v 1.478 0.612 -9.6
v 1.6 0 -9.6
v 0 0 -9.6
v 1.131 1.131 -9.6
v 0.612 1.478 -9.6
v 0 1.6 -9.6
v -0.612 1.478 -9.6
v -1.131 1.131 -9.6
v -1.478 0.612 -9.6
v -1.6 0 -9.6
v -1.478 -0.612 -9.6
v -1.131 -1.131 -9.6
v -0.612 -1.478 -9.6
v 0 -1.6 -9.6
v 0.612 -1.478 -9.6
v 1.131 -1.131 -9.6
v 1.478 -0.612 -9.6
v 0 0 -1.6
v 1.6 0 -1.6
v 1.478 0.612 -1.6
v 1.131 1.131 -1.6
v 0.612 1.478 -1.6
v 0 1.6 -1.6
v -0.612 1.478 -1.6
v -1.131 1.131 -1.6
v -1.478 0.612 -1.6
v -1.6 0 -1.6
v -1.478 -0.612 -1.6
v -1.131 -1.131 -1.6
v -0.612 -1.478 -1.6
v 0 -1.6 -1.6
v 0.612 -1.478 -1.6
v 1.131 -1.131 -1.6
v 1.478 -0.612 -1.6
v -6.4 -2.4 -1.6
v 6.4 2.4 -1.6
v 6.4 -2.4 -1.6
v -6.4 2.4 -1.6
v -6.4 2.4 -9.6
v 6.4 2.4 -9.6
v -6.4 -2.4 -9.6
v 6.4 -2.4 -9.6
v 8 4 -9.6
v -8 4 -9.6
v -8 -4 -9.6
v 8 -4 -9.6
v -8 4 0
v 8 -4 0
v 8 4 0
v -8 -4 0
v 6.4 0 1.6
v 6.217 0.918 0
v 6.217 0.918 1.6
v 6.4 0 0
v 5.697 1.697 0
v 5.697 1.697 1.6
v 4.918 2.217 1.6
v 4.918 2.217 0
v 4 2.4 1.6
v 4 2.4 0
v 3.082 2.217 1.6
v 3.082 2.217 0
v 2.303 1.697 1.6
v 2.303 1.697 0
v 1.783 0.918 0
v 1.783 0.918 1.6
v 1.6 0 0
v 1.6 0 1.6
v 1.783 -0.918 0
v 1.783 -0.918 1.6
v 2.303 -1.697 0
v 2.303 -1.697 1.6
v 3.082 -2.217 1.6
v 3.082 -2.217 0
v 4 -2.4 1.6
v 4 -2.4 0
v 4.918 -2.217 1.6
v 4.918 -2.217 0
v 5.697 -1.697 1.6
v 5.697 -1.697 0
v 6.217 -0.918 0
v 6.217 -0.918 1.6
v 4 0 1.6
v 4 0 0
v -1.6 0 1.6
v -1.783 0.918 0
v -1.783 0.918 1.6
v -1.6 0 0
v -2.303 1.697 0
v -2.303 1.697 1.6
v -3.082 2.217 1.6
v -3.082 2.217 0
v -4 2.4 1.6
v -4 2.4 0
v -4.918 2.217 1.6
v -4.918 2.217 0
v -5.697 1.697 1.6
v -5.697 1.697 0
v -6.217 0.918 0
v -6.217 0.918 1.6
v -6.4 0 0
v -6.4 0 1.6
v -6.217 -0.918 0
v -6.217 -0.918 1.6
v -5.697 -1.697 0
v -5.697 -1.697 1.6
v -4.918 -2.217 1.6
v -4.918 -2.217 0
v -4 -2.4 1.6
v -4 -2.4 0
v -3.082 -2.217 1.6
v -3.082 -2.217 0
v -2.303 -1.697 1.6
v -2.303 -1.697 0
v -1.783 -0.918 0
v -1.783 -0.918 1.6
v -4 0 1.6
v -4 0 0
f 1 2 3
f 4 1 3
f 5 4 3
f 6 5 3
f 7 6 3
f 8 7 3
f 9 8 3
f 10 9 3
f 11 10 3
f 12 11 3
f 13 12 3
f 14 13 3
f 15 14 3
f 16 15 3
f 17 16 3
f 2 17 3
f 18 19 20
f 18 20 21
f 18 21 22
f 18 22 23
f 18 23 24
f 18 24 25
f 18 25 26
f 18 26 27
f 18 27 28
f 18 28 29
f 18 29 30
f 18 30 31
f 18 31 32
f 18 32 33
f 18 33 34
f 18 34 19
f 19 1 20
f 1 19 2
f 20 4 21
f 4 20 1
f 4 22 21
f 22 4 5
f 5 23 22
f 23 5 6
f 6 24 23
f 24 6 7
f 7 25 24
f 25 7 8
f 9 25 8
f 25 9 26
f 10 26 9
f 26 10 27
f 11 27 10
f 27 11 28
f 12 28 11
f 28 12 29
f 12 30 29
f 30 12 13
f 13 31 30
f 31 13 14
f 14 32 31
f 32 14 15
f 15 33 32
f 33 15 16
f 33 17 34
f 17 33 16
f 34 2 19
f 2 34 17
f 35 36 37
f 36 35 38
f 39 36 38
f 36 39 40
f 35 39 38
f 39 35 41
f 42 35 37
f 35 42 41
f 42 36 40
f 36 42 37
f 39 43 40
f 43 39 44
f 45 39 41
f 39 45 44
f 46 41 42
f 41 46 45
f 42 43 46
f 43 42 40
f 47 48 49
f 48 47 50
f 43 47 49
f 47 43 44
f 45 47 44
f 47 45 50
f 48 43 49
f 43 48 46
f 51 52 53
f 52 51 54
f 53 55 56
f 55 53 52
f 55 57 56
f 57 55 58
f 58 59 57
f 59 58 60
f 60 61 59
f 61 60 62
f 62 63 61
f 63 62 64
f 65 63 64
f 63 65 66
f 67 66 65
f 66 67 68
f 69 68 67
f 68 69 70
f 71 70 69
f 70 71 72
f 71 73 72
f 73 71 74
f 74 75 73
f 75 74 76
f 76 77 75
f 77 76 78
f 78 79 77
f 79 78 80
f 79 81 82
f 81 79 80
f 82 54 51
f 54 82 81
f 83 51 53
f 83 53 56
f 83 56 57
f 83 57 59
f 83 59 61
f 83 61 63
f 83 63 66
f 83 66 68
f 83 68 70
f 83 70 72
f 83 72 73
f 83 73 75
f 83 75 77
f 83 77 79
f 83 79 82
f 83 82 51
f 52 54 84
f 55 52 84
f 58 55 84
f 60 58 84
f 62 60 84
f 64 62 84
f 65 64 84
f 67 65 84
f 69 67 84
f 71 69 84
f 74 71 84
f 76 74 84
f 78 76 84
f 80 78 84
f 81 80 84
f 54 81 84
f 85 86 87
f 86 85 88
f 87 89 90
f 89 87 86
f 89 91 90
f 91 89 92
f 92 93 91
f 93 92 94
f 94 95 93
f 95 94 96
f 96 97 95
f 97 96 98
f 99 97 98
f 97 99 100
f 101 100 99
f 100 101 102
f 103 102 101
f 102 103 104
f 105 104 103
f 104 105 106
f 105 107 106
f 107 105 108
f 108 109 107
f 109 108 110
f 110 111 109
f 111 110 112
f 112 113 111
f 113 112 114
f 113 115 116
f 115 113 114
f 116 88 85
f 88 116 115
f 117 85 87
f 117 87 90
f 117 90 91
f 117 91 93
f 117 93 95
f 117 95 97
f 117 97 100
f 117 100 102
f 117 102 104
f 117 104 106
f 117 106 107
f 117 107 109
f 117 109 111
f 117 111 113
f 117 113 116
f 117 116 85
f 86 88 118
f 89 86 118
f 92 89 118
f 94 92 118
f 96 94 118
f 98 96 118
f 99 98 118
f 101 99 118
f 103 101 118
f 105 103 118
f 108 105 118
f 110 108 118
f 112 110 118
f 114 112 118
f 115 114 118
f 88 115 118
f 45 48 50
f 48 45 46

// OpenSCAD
// file: ../p/4-4edge.scad
use <../lib.scad>
function ldraw_lib__4_4edge() = [
// 0 Circle 1.0
// 0 Name: 4-4edge.dat
// 0 Author: James Jessiman
// 0 !LDRAW_ORG Primitive UPDATE 2017-01
// 0 !LICENSE Licensed under CC BY 2.0 and CC BY 4.0 : see CAreadme.txt
// 
// 0 BFC CERTIFY CCW
  [0,"BFC","CERTIFY"],
  [0,"BFC","CCW"],
// 
// 0 !HISTORY 1998-12-15 [PTadmin] Official Update 1998-10
// 0 !HISTORY 2005-12-28 [PTadmin] Official Update 2005-01
// 0 !HISTORY 2007-06-24 [PTadmin] Header formatted for Contributor Agreement
// 0 !HISTORY 2008-07-01 [PTadmin] Official Update 2008-01
// 0 !HISTORY 2017-01-15 [Steffen] BFCed
// 0 !HISTORY 2017-12-30 [PTadmin] Official Update 2017-01
// 
// 
// 2 24 1 0 0 0.9239 0 0.3827
  [2,24,1,0,0,0.9239,0,0.3827],
// 2 24 0.9239 0 0.3827 0.7071 0 0.7071
  [2,24,0.9239,0,0.3827,0.7071,0,0.7071],
// 2 24 0.7071 0 0.7071 0.3827 0 0.9239
  [2,24,0.7071,0,0.7071,0.3827,0,0.9239],
// 2 24 0.3827 0 0.9239 0 0 1
  [2,24,0.3827,0,0.9239,0,0,1],
// 2 24 0 0 1 -0.3827 0 0.9239
  [2,24,0,0,1,-0.3827,0,0.9239],
// 2 24 -0.3827 0 0.9239 -0.7071 0 0.7071
  [2,24,-0.3827,0,0.9239,-0.7071,0,0.7071],
// 2 24 -0.7071 0 0.7071 -0.9239 0 0.3827
  [2,24,-0.7071,0,0.7071,-0.9239,0,0.3827],
// 2 24 -0.9239 0 0.3827 -1 0 -0
  [2,24,-0.9239,0,0.3827,-1,0,-0],
// 2 24 -1 0 -0 -0.9239 0 -0.3827
  [2,24,-1,0,-0,-0.9239,0,-0.3827],
// 2 24 -0.9239 0 -0.3827 -0.7071 0 -0.7071
  [2,24,-0.9239,0,-0.3827,-0.7071,0,-0.7071],
// 2 24 -0.7071 0 -0.7071 -0.3827 0 -0.9239
  [2,24,-0.7071,0,-0.7071,-0.3827,0,-0.9239],
// 2 24 -0.3827 0 -0.9239 0 0 -1
  [2,24,-0.3827,0,-0.9239,0,0,-1],
// 2 24 0 0 -1 0.3827 0 -0.9239
  [2,24,0,0,-1,0.3827,0,-0.9239],
// 2 24 0.3827 0 -0.9239 0.7071 0 -0.7071
  [2,24,0.3827,0,-0.9239,0.7071,0,-0.7071],
// 2 24 0.7071 0 -0.7071 0.9239 0 -0.3827
  [2,24,0.7071,0,-0.7071,0.9239,0,-0.3827],
// 2 24 0.9239 0 -0.3827 1 0 0
  [2,24,0.9239,0,-0.3827,1,0,0],
];
module ldraw_lib__4_4edge(step=0, col=false, unit=2/5, alt=false, line=0.2, solid=!$preview)
    makepoly(ldraw_lib__4_4edge(), step=step, col=col, unit=unit, alt=alt, line=line, solid=solid);
ldraw_lib__4_4edge(line=0.2);
// file: ../p/4-4disc.scad
use <../lib.scad>
function ldraw_lib__4_4disc() = [
// 0 Disc 1.0
// 0 Name: 4-4disc.dat
// 0 Author: James Jessiman
// 0 !LDRAW_ORG Primitive UPDATE 2002-02
// 0 !LICENSE Licensed under CC BY 2.0 and CC BY 4.0 : see CAreadme.txt
// 
// 0 BFC CERTIFY CCW
  [0,"BFC","CERTIFY"],
  [0,"BFC","CCW"],
// 
// 0 !HISTORY 1998-12-15 [PTadmin] Official Update 1998-10
// 0 !HISTORY 2002-03-23 [sbliss] Added BFC statement
// 0 !HISTORY 2002-04-25 [PTadmin] Official Update 2002-02
// 0 !HISTORY 2007-06-24 [PTadmin] Header formatted for Contributor Agreement
// 0 !HISTORY 2008-07-01 [PTadmin] Official Update 2008-01
// 
// 
// 3 16 0 0 0 1 0 0 0.9239 0 0.3827
  [3,16,0,0,0,1,0,0,0.9239,0,0.3827],
// 3 16 0 0 0 0.9239 0 0.3827 0.7071 0 0.7071
  [3,16,0,0,0,0.9239,0,0.3827,0.7071,0,0.7071],
// 3 16 0 0 0 0.7071 0 0.7071 0.3827 0 0.9239
  [3,16,0,0,0,0.7071,0,0.7071,0.3827,0,0.9239],
// 3 16 0 0 0 0.3827 0 0.9239 0 0 1
  [3,16,0,0,0,0.3827,0,0.9239,0,0,1],
// 3 16 0 0 0 0 0 1 -0.3827 0 0.9239
  [3,16,0,0,0,0,0,1,-0.3827,0,0.9239],
// 3 16 0 0 0 -0.3827 0 0.9239 -0.7071 0 0.7071
  [3,16,0,0,0,-0.3827,0,0.9239,-0.7071,0,0.7071],
// 3 16 0 0 0 -0.7071 0 0.7071 -0.9239 0 0.3827
  [3,16,0,0,0,-0.7071,0,0.7071,-0.9239,0,0.3827],
// 3 16 0 0 0 -0.9239 0 0.3827 -1 0 -0
  [3,16,0,0,0,-0.9239,0,0.3827,-1,0,-0],
// 3 16 0 0 0 -1 0 -0 -0.9239 0 -0.3827
  [3,16,0,0,0,-1,0,-0,-0.9239,0,-0.3827],
// 3 16 0 0 0 -0.9239 0 -0.3827 -0.7071 0 -0.7071
  [3,16,0,0,0,-0.9239,0,-0.3827,-0.7071,0,-0.7071],
// 3 16 0 0 0 -0.7071 0 -0.7071 -0.3827 0 -0.9239
  [3,16,0,0,0,-0.7071,0,-0.7071,-0.3827,0,-0.9239],
// 3 16 0 0 0 -0.3827 0 -0.9239 0 0 -1
  [3,16,0,0,0,-0.3827,0,-0.9239,0,0,-1],
// 3 16 0 0 0 0 0 -1 0.3827 0 -0.9239
  [3,16,0,0,0,0,0,-1,0.3827,0,-0.9239],
// 3 16 0 0 0 0.3827 0 -0.9239 0.7071 0 -0.7071
  [3,16,0,0,0,0.3827,0,-0.9239,0.7071,0,-0.7071],
// 3 16 0 0 0 0.7071 0 -0.7071 0.9239 0 -0.3827
  [3,16,0,0,0,0.7071,0,-0.7071,0.9239,0,-0.3827],
// 3 16 0 0 0 0.9239 0 -0.3827 1 0 0
  [3,16,0,0,0,0.9239,0,-0.3827,1,0,0],
// 0
];
module ldraw_lib__4_4disc(step=0, col=false, unit=2/5, alt=false, line=0.2, solid=!$preview)
    makepoly(ldraw_lib__4_4disc(), step=step, col=col, unit=unit, alt=alt, line=line, solid=solid);
ldraw_lib__4_4disc(line=0.2);
// file: ../p/4-4cyli.scad
use <../lib.scad>
$fa=1; $fs=0.2;
function ldraw_lib__4_4cyli(realsolid=false) = [
// 0 Cylinder 1.0
// 0 Name: 4-4cyli.dat
// 0 Author: James Jessiman
// 0 !LDRAW_ORG Primitive UPDATE 2005-01
// 0 !LICENSE Licensed under CC BY 2.0 and CC BY 4.0 : see CAreadme.txt
// 
// 0 BFC CERTIFY CCW
  [0,"BFC","CERTIFY"],
  [0,"BFC","CCW"],
// 
// 0 !HISTORY 1998-12-15 [PTadmin] Official Update 1998-10
// 0 !HISTORY 2002-03-23 [sbliss] Added BFC statement; merged headers from files in distributions LDraw 0.27 and Complete.
// 0 !HISTORY 2002-04-25 [PTadmin] Official Update 2002-02
// 0 !HISTORY 2004-12-14 [guyvivan] BFC CCW
// 0 !HISTORY 2005-12-28 [PTadmin] Official Update 2005-01
// 0 !HISTORY 2007-06-24 [PTadmin] Header formatted for Contributor Agreement
// 0 !HISTORY 2008-07-01 [PTadmin] Official Update 2008-01
// 
// 
// 4 16 1 1 0 0.9239 1 0.3827 0.9239 0 0.3827 1 0 0
  [4,16,1,1,0,0.9239,1,0.3827,0.9239,0,0.3827,1,0,0],
// 5 24 1 0 0 1 1 0 0.9239 0 0.3827 0.9239 0 -0.3827
  [5,24,1,0,0,1,1,0,0.9239,0,0.3827,0.9239,0,-0.3827],
// 4 16 0.9239 1 0.3827 0.7071 1 0.7071 0.7071 0 0.7071 0.9239 0 0.3827
  [4,16,0.9239,1,0.3827,0.7071,1,0.7071,0.7071,0,0.7071,0.9239,0,0.3827],
// 5 24 0.9239 0 0.3827 0.9239 1 0.3827 0.7071 0 0.7071 1 0 0
  [5,24,0.9239,0,0.3827,0.9239,1,0.3827,0.7071,0,0.7071,1,0,0],
// 4 16 0.7071 1 0.7071 0.3827 1 0.9239 0.3827 0 0.9239 0.7071 0 0.7071
  [4,16,0.7071,1,0.7071,0.3827,1,0.9239,0.3827,0,0.9239,0.7071,0,0.7071],
// 5 24 0.7071 0 0.7071 0.7071 1 0.7071 0.3827 0 0.9239 0.9239 0 0.3827
  [5,24,0.7071,0,0.7071,0.7071,1,0.7071,0.3827,0,0.9239,0.9239,0,0.3827],
// 4 16 0.3827 1 0.9239 0 1 1 0 0 1 0.3827 0 0.9239
  [4,16,0.3827,1,0.9239,0,1,1,0,0,1,0.3827,0,0.9239],
// 5 24 0.3827 0 0.9239 0.3827 1 0.9239 0 0 1 0.7071 0 0.7071
  [5,24,0.3827,0,0.9239,0.3827,1,0.9239,0,0,1,0.7071,0,0.7071],
// 4 16 0 1 1 -0.3827 1 0.9239 -0.3827 0 0.9239 0 0 1
  [4,16,0,1,1,-0.3827,1,0.9239,-0.3827,0,0.9239,0,0,1],
// 5 24 0 0 1 0 1 1 -0.3827 0 0.9239 0.3827 0 0.9239
  [5,24,0,0,1,0,1,1,-0.3827,0,0.9239,0.3827,0,0.9239],
// 4 16 -0.3827 1 0.9239 -0.7071 1 0.7071 -0.7071 0 0.7071 -0.3827 0 0.9239
  [4,16,-0.3827,1,0.9239,-0.7071,1,0.7071,-0.7071,0,0.7071,-0.3827,0,0.9239],
// 5 24 -0.3827 0 0.9239 -0.3827 1 0.9239 -0.7071 0 0.7071 0 0 1
  [5,24,-0.3827,0,0.9239,-0.3827,1,0.9239,-0.7071,0,0.7071,0,0,1],
// 4 16 -0.7071 1 0.7071 -0.9239 1 0.3827 -0.9239 0 0.3827 -0.7071 0 0.7071
  [4,16,-0.7071,1,0.7071,-0.9239,1,0.3827,-0.9239,0,0.3827,-0.7071,0,0.7071],
// 5 24 -0.7071 0 0.7071 -0.7071 1 0.7071 -0.9239 0 0.3827 -0.3827 0 0.9239
  [5,24,-0.7071,0,0.7071,-0.7071,1,0.7071,-0.9239,0,0.3827,-0.3827,0,0.9239],
// 4 16 -0.9239 1 0.3827 -1 1 0 -1 0 0 -0.9239 0 0.3827
  [4,16,-0.9239,1,0.3827,-1,1,0,-1,0,0,-0.9239,0,0.3827],
// 5 24 -0.9239 0 0.3827 -0.9239 1 0.3827 -1 0 0 -0.7071 0 0.7071
  [5,24,-0.9239,0,0.3827,-0.9239,1,0.3827,-1,0,0,-0.7071,0,0.7071],
// 4 16 -1 1 0 -0.9239 1 -0.3827 -0.9239 0 -0.3827 -1 0 0
  [4,16,-1,1,0,-0.9239,1,-0.3827,-0.9239,0,-0.3827,-1,0,0],
// 5 24 -1 0 0 -1 1 0 -0.9239 0 -0.3827 -0.9239 0 0.3827
  [5,24,-1,0,0,-1,1,0,-0.9239,0,-0.3827,-0.9239,0,0.3827],
// 4 16 -0.9239 1 -0.3827 -0.7071 1 -0.7071 -0.7071 0 -0.7071 -0.9239 0 -0.3827
  [4,16,-0.9239,1,-0.3827,-0.7071,1,-0.7071,-0.7071,0,-0.7071,-0.9239,0,-0.3827],
// 5 24 -0.9239 0 -0.3827 -0.9239 1 -0.3827 -0.7071 0 -0.7071 -1 0 0
  [5,24,-0.9239,0,-0.3827,-0.9239,1,-0.3827,-0.7071,0,-0.7071,-1,0,0],
// 4 16 -0.7071 1 -0.7071 -0.3827 1 -0.9239 -0.3827 0 -0.9239 -0.7071 0 -0.7071
  [4,16,-0.7071,1,-0.7071,-0.3827,1,-0.9239,-0.3827,0,-0.9239,-0.7071,0,-0.7071],
// 5 24 -0.7071 0 -0.7071 -0.7071 1 -0.7071 -0.3827 0 -0.9239 -0.9239 0 -0.3827
  [5,24,-0.7071,0,-0.7071,-0.7071,1,-0.7071,-0.3827,0,-0.9239,-0.9239,0,-0.3827],
// 4 16 -0.3827 1 -0.9239 0 1 -1 0 0 -1 -0.3827 0 -0.9239
  [4,16,-0.3827,1,-0.9239,0,1,-1,0,0,-1,-0.3827,0,-0.9239],
// 5 24 -0.3827 0 -0.9239 -0.3827 1 -0.9239 0 0 -1 -0.7071 0 -0.7071
  [5,24,-0.3827,0,-0.9239,-0.3827,1,-0.9239,0,0,-1,-0.7071,0,-0.7071],
// 4 16 0 1 -1 0.3827 1 -0.9239 0.3827 0 -0.9239 0 0 -1
  [4,16,0,1,-1,0.3827,1,-0.9239,0.3827,0,-0.9239,0,0,-1],
// 5 24 0 0 -1 0 1 -1 0.3827 0 -0.9239 -0.3827 0 -0.9239
  [5,24,0,0,-1,0,1,-1,0.3827,0,-0.9239,-0.3827,0,-0.9239],
// 4 16 0.3827 1 -0.9239 0.7071 1 -0.7071 0.7071 0 -0.7071 0.3827 0 -0.9239
  [4,16,0.3827,1,-0.9239,0.7071,1,-0.7071,0.7071,0,-0.7071,0.3827,0,-0.9239],
// 5 24 0.3827 0 -0.9239 0.3827 1 -0.9239 0.7071 0 -0.7071 0 0 -1
  [5,24,0.3827,0,-0.9239,0.3827,1,-0.9239,0.7071,0,-0.7071,0,0,-1],
// 4 16 0.7071 1 -0.7071 0.9239 1 -0.3827 0.9239 0 -0.3827 0.7071 0 -0.7071
  [4,16,0.7071,1,-0.7071,0.9239,1,-0.3827,0.9239,0,-0.3827,0.7071,0,-0.7071],
// 5 24 0.7071 0 -0.7071 0.7071 1 -0.7071 0.9239 0 -0.3827 0.3827 0 -0.9239
  [5,24,0.7071,0,-0.7071,0.7071,1,-0.7071,0.9239,0,-0.3827,0.3827,0,-0.9239],
// 4 16 0.9239 1 -0.3827 1 1 0 1 0 0 0.9239 0 -0.3827
  [4,16,0.9239,1,-0.3827,1,1,0,1,0,0,0.9239,0,-0.3827],
// 5 24 0.9239 0 -0.3827 0.9239 1 -0.3827 1 0 0 0.7071 0 -0.7071
  [5,24,0.9239,0,-0.3827,0.9239,1,-0.3827,1,0,0,0.7071,0,-0.7071],
// 0
];
module ldraw_lib__4_4cyli(step=0, col=false, unit=2/5, alt=false, line=0.2, solid=!$preview)
    makepoly(ldraw_lib__4_4cyli(solid), step=step, col=col, unit=unit, alt=alt, line=line, solid=solid);
ldraw_lib__4_4cyli(line=0.2);
// file: ../p/stud3.scad
use <../lib.scad>
use <4-4cyli.scad>
use <4-4disc.scad>
use <4-4edge.scad>
function ldraw_lib__stud3() = [
// 0 Stud Tube Solid
// 0 Name: stud3.dat
// 0 Author: James Jessiman
// 0 !LDRAW_ORG Primitive UPDATE 2012-01
// 0 !LICENSE Licensed under CC BY 4.0 : see CAreadme.txt
// 
// 0 BFC CERTIFY CCW
  [0,"BFC","CERTIFY"],
  [0,"BFC","CCW"],
// 
// 0 !HISTORY 2002-04-04 [sbliss] Modified for BFC compliance
// 0 !HISTORY 2002-04-25 [PTadmin] Official Update 2002-02
// 0 !HISTORY 2007-06-24 [PTadmin] Header formatted for Contributor Agreement
// 0 !HISTORY 2008-07-01 [PTadmin] Official Update 2008-01
// 0 !HISTORY 2012-02-16 [Philo] Changed to CCW
// 0 !HISTORY 2012-03-30 [PTadmin] Official Update 2012-01
// 
// 
// 1 16 0 -4 0 4 0 0 0 1 0 0 0 4 4-4edge.dat
  [1,16,0,-4,0,4,0,0,0,1,0,0,0,4, ldraw_lib__4_4edge()],
// 1 16 0 0 0 4 0 0 0 1 0 0 0 4 4-4edge.dat
  [1,16,0,0,0,4,0,0,0,1,0,0,0,4, ldraw_lib__4_4edge()],
// 1 16 0 -4 0 4 0 0 0 1 0 0 0 4 4-4disc.dat
  [1,16,0,-4,0,4,0,0,0,1,0,0,0,4, ldraw_lib__4_4disc()],
  [-1,16,0,0,0,4,0,0,0,-1,0,0,0,4, ldraw_lib__4_4disc()],
// 1 16 0 -4 0 4 0 0 0 4 0 0 0 4 4-4cyli.dat
  [1,16,0,-4,0,4,0,0,0,4,0,0,0,4, ldraw_lib__4_4cyli()],
];
module ldraw_lib__stud3(step=0, col=false, unit=2/5, alt=false, line=0.2, solid=!$preview)
    makepoly(ldraw_lib__stud3(), step=step, col=col, unit=unit, alt=alt, line=line, solid=solid);
ldraw_lib__stud3(line=0.2);
// file: ../p/stud.scad
use <../lib.scad>
use <4-4cyli.scad>
use <4-4disc.scad>
use <4-4edge.scad>
function ldraw_lib__stud() = [
// 0 Stud
// 0 Name: stud.dat
// 0 Author: James Jessiman
// 0 !LDRAW_ORG Primitive UPDATE 2012-01
// 0 !LICENSE Licensed under CC BY 4.0 : see CAreadme.txt
// 
// 0 BFC CERTIFY CCW
  [0,"BFC","CERTIFY"],
  [0,"BFC","CCW"],
// 
// 0 !HISTORY 2002-04-04 [sbliss] Modified for BFC compliance
// 0 !HISTORY 2002-04-25 [PTadmin] Official Update 2002-02
// 0 !HISTORY 2007-06-24 [PTadmin] Header formatted for Contributor Agreement
// 0 !HISTORY 2008-07-01 [PTadmin] Official Update 2008-01
// 0 !HISTORY 2012-02-16 [Philo] Changed to CCW
// 0 !HISTORY 2012-03-30 [PTadmin] Official Update 2012-01
// 
// 
// 1 16 0 0 0 6 0 0 0 1 0 0 0 6 4-4edge.dat
  [1,16,0,0,0,6,0,0,0,1,0,0,0,6, ldraw_lib__4_4edge()],
// 1 16 0 -4 0 6 0 0 0 1 0 0 0 6 4-4edge.dat
  [1,16,0,-4,0,6,0,0,0,1,0,0,0,6, ldraw_lib__4_4edge()],
// 1 16 0 0 0 6 0 0 0 -4 0 0 0 6 4-4cyli.dat
  [1,16,0,0,0,6,0,0,0,-4,0,0,0,6, ldraw_lib__4_4cyli()],
// 1 16 0 -4 0 6 0 0 0 1 0 0 0 6 4-4disc.dat
  [1,16,0,-4,0,6,0,0,0,1,0,0,0,6, ldraw_lib__4_4disc()],
  [-1,16,0,0,0,6,0,0,0,-1,0,0,0,6, ldraw_lib__4_4disc()],
];
module ldraw_lib__stud(step=0, col=false, unit=2/5, alt=false, line=0.2, solid=!$preview)
    makepoly(ldraw_lib__stud(), step=step, col=col, unit=unit, alt=alt, line=line, solid=solid);
ldraw_lib__stud(line=0.2);
// file: ../p/box5.scad
use <../lib.scad>
function ldraw_lib__box5() = [
// 0 Box with 5 Faces and All Edges
// 0 Name: box5.dat
// 0 Author: James Jessiman
// 0 !LDRAW_ORG Primitive UPDATE 2012-01
// 0 !LICENSE Licensed under CC BY 2.0 and CC BY 4.0 : see CAreadme.txt
// 
// 0 BFC CERTIFY CCW
  [0,"BFC","CERTIFY"],
  [0,"BFC","CCW"],
// 
// 0 !HISTORY 2002-04-03 [sbliss] Modified for BFC compliance
// 0 !HISTORY 2002-04-25 [PTadmin] Official Update 2002-02
// 0 !HISTORY 2007-06-24 [PTadmin] Header formatted for Contributor Agreement
// 0 !HISTORY 2008-07-01 [PTadmin] Official Update 2008-01
// 0 !HISTORY 2012-02-16 [Philo] Changed to CCW
// 0 !HISTORY 2012-03-30 [PTadmin] Official Update 2012-01
// 
// 
// 2 24 1 1 1 -1 1 1
  [2,24,1,1,1,-1,1,1],
// 2 24 -1 1 1 -1 1 -1
  [2,24,-1,1,1,-1,1,-1],
// 2 24 -1 1 -1 1 1 -1
  [2,24,-1,1,-1,1,1,-1],
// 2 24 1 1 -1 1 1 1
  [2,24,1,1,-1,1,1,1],
// 2 24 1 0 1 -1 0 1
  [2,24,1,0,1,-1,0,1],
// 2 24 -1 0 1 -1 0 -1
  [2,24,-1,0,1,-1,0,-1],
// 2 24 -1 0 -1 1 0 -1
  [2,24,-1,0,-1,1,0,-1],
// 2 24 1 0 -1 1 0 1
  [2,24,1,0,-1,1,0,1],
// 2 24 1 0 1 1 1 1
  [2,24,1,0,1,1,1,1],
// 2 24 -1 0 1 -1 1 1
  [2,24,-1,0,1,-1,1,1],
// 2 24 1 0 -1 1 1 -1
  [2,24,1,0,-1,1,1,-1],
// 2 24 -1 0 -1 -1 1 -1
  [2,24,-1,0,-1,-1,1,-1],
// 4 16 -1 1 1 1 1 1 1 1 -1 -1 1 -1
  [4,16,-1,1,1,1,1,1,1,1,-1,-1,1,-1],
// 4 16 -1 1 1 -1 0 1 1 0 1 1 1 1
  [4,16,-1,1,1,-1,0,1,1,0,1,1,1,1],
// 4 16 -1 1 -1 -1 0 -1 -1 0 1 -1 1 1
  [4,16,-1,1,-1,-1,0,-1,-1,0,1,-1,1,1],
// 4 16 1 1 -1 1 0 -1 -1 0 -1 -1 1 -1
  [4,16,1,1,-1,1,0,-1,-1,0,-1,-1,1,-1],
// 4 16 1 1 1 1 0 1 1 0 -1 1 1 -1
  [4,16,1,1,1,1,0,1,1,0,-1,1,1,-1],
];
makepoly(ldraw_lib__box5(), line=0.2);
// file: ../p/box4t.scad
use <../lib.scad>
function ldraw_lib__box4t() = [
// 0 Box with 4 Adjacent Faces and All Edges
// 0 Name: box4t.dat
// 0 Author: Tore Eriksson [Tore_Eriksson]
// 0 !LDRAW_ORG Primitive UPDATE 2003-02
// 0 !LICENSE Licensed under CC BY 2.0 and CC BY 4.0 : see CAreadme.txt
// 
// 0 BFC CERTIFY CCW
  [0,"BFC","CERTIFY"],
  [0,"BFC","CCW"],
// 
// 0 !HISTORY 1997-09-29 [PTadmin] Official Update 1997-15
// 0 !HISTORY 2002-08-31 [izanette] Modified with WINDZ for BFC compliance
// 0 !HISTORY 2003-08-01 [PTadmin] Official Update 2003-02
// 0 !HISTORY 2007-06-24 [PTadmin] Header formatted for Contributor Agreement
// 0 !HISTORY 2008-07-01 [PTadmin] Official Update 2008-01
// 
// 
// 2 24 1 1 1 -1 1 1
  [2,24,1,1,1,-1,1,1],
// 2 24 -1 1 1 -1 1 -1
  [2,24,-1,1,1,-1,1,-1],
// 2 24 -1 1 -1 1 1 -1
  [2,24,-1,1,-1,1,1,-1],
// 2 24 1 1 -1 1 1 1
  [2,24,1,1,-1,1,1,1],
// 2 24 1 0 1 -1 0 1
  [2,24,1,0,1,-1,0,1],
// 2 24 -1 0 1 -1 0 -1
  [2,24,-1,0,1,-1,0,-1],
// 2 24 -1 0 -1 1 0 -1
  [2,24,-1,0,-1,1,0,-1],
// 2 24 1 0 -1 1 0 1
  [2,24,1,0,-1,1,0,1],
// 2 24 1 0 1 1 1 1
  [2,24,1,0,1,1,1,1],
// 2 24 -1 0 1 -1 1 1
  [2,24,-1,0,1,-1,1,1],
// 2 24 1 0 -1 1 1 -1
  [2,24,1,0,-1,1,1,-1],
// 2 24 -1 0 -1 -1 1 -1
  [2,24,-1,0,-1,-1,1,-1],
// 4 16 1 1 1 1 1 -1 -1 1 -1 -1 1 1
  [4,16,1,1,1,1,1,-1,-1,1,-1,-1,1,1],
// 4 16 1 1 1 -1 1 1 -1 0 1 1 0 1
  [4,16,1,1,1,-1,1,1,-1,0,1,1,0,1],
// 4 16 -1 1 1 -1 1 -1 -1 0 -1 -1 0 1
  [4,16,-1,1,1,-1,1,-1,-1,0,-1,-1,0,1],
// 0 4 16 -1 1 -1 -1 0 -1 1 0 -1 1 1 -1
// 4 16 1 1 -1 1 1 1 1 0 1 1 0 -1
  [4,16,1,1,-1,1,1,1,1,0,1,1,0,-1],
// 0
];
makepoly(ldraw_lib__box4t(), line=0.2);
// file: s/3004s01.scad
use <../../lib.scad>
use <../../p/box4t.scad>
use <../../p/box5.scad>
use <../../p/stud.scad>
use <../../p/stud3.scad>
$fa=1; $fs=0.2;
function ldraw_lib__s__3004s01(realsolid=false) = [
// 0 ~Brick  1 x  2 without Front Face
// 0 Name: s\3004s01.dat
// 0 Author: James Jessiman
// 0 !LDRAW_ORG Subpart UPDATE 2003-03
// 0 !LICENSE Licensed under CC BY 2.0 and CC BY 4.0 : see CAreadme.txt
// 
// 0 BFC CERTIFY CCW
  [0,"BFC","CERTIFY"],
  [0,"BFC","CCW"],
// 
// 0 !HISTORY 2003-09-07 [jriley] Subfiling, BFC
// 0 !HISTORY 2003-12-19 [PTadmin] Official Update 2003-03
// 0 !HISTORY 2007-08-29 [PTadmin] Header formatted for Contributor Agreement
// 0 !HISTORY 2008-07-01 [PTadmin] Official Update 2008-01
// 
// 
// 1 16 0 4 0 1 0 0 0 -5 0 0 0 1 stud3.dat
  [1,16,0,4,0,1,0,0,0,-5,0,0,0,1, ldraw_lib__stud3(realsolid)],
// 0 BFC INVERTNEXT
  [0,"BFC","INVERTNEXT"],
// 1 16 0 24 0 16 0 0 0 -20 0 0 0 6 box5.dat
  [1,16,0,24,0,16,0,0,0,-20,0,0,0,6, ldraw_lib__box5(realsolid)],
// 4 16 20 24 10 16 24 6 -16 24 6 -20 24 10
  [4,16,20,24,10,16,24,6,-16,24,6,-20,24,10],
// 4 16 -20 24 10 -16 24 6 -16 24 -6 -20 24 -10
  [4,16,-20,24,10,-16,24,6,-16,24,-6,-20,24,-10],
// 4 16 -20 24 -10 -16 24 -6 16 24 -6 20 24 -10
  [4,16,-20,24,-10,-16,24,-6,16,24,-6,20,24,-10],
// 4 16 20 24 -10 16 24 -6 16 24 6 20 24 10
  [4,16,20,24,-10,16,24,-6,16,24,6,20,24,10],
// 1 16 0 24 0 20 0 0 0 -24 0 0 0 10 box4t.dat
  [1,16,0,24,0,20,0,0,0,-24,0,0,0,10, ldraw_lib__box4t(realsolid)],
// 1 16 10 0 0 1 0 0 0 1 0 0 0 1 stud.dat
  [1,16,10,0,0,1,0,0,0,1,0,0,0,1, ldraw_lib__stud(realsolid)],
// 1 16 -10 0 0 1 0 0 0 1 0 0 0 1 stud.dat
  [1,16,-10,0,0,1,0,0,0,1,0,0,0,1, ldraw_lib__stud(realsolid)],
// 0
];
module ldraw_lib__s__3004s01(step=0, col=false, unit=2/5, alt=false, line=0.2, solid=!$preview)
    makepoly(ldraw_lib__s__3004s01(solid), step=step, col=col, unit=unit, alt=alt, line=line, solid=solid);
ldraw_lib__s__3004s01(line=0.2);
// file: 3004.scad
use <../lib.scad>
use <s/3004s01.scad>
function ldraw_lib__3004() = [
// 0 Brick  1 x  2
// 0 Name: 3004.dat
// 0 Author: James Jessiman
// 0 !LDRAW_ORG Part UPDATE 2022-05
// 0 !LICENSE Licensed under CC BY 2.0 and CC BY 4.0 : see CAreadme.txt
// 
// 0 BFC CERTIFY CCW
  [0,"BFC","CERTIFY"],
  [0,"BFC","CCW"],
// 
// 0 !HISTORY 2001-10-26 [PTadmin] Official Update 2001-01
// 0 !HISTORY 2002-05-07 {unknown} BFC Certification
// 0 !HISTORY 2002-06-11 [PTadmin] Official Update 2002-03
// 0 !HISTORY 2007-05-07 [PTadmin] Header formatted for Contributor Agreement
// 0 !HISTORY 2008-07-01 [PTadmin] Official Update 2008-01
// 0 !HISTORY 2022-08-04 [MagFors] Using subfile
// 0 !HISTORY 2022-09-15 [PTadmin] Official Update 2022-05
// 
// 
// 1 16 0 0 0 1 0 0 0 1 0 0 0 1 s\3004s01.dat
  [1,16,0,0,0,1,0,0,0,1,0,0,0,1, ldraw_lib__s__3004s01()],
// 4 16 -20 24 -10 20 24 -10 20 0 -10 -20 0 -10
  [4,16,-20,24,-10,20,24,-10,20,0,-10,-20,0,-10],
];
module ldraw_lib__3004(step=0, col=false, unit=2/5, alt=false, line=0.2, solid=!$preview)
    makepoly(ldraw_lib__3004(), step=step, col=col, unit=unit, alt=alt, line=line, solid=solid);
ldraw_lib__3004(line=0.2);
// main file
use <../lib.scad>
use <3004.scad>
function ldraw_lib__300421() = [
// 0 ~_Brick  1 x  2 Red (Obsolete)
// 0 Name: 300421.dat
// 0 Author: Michael Heidemann [mikeheide]
// 0 !LDRAW_ORG Part Physical_Colour UPDATE 2019-02
// 0 !LICENSE Licensed under CC BY 4.0 : see CAreadme.txt
// 
// 0 BFC CERTIFY CCW
  [0,"BFC","CERTIFY"],
  [0,"BFC","CCW"],
// 
// 0 !CATEGORY Obsolete
// 
// 0 !HISTORY 2010-12-31 [PTadmin] Official Update 2010-03
// 0 !HISTORY 2019-07-19 [Holly-Wood] Obsoleted per decision not to include physical colour parts
// 0 !HISTORY 2019-09-09 [PTadmin] Official Update 2019-02
// 
// 
// 0 // This file is a "shortcut" with the correct number for the actual
// 0 // colouring of the part (Red).
// 
// 1 4 0 0 0 1 0 0 0 1 0 0 0 1 3004.dat
  [1,4,0,0,0,1,0,0,0,1,0,0,0,1, ldraw_lib__3004()],
];
module ldraw_lib__300421(step=0, col=false, unit=2/5, alt=false, line=0.2, solid=!$preview)
    makepoly(ldraw_lib__300421(), step=step, col=col, unit=unit, alt=alt, line=line, solid=solid);
ldraw_lib__300421(line=0.2);
